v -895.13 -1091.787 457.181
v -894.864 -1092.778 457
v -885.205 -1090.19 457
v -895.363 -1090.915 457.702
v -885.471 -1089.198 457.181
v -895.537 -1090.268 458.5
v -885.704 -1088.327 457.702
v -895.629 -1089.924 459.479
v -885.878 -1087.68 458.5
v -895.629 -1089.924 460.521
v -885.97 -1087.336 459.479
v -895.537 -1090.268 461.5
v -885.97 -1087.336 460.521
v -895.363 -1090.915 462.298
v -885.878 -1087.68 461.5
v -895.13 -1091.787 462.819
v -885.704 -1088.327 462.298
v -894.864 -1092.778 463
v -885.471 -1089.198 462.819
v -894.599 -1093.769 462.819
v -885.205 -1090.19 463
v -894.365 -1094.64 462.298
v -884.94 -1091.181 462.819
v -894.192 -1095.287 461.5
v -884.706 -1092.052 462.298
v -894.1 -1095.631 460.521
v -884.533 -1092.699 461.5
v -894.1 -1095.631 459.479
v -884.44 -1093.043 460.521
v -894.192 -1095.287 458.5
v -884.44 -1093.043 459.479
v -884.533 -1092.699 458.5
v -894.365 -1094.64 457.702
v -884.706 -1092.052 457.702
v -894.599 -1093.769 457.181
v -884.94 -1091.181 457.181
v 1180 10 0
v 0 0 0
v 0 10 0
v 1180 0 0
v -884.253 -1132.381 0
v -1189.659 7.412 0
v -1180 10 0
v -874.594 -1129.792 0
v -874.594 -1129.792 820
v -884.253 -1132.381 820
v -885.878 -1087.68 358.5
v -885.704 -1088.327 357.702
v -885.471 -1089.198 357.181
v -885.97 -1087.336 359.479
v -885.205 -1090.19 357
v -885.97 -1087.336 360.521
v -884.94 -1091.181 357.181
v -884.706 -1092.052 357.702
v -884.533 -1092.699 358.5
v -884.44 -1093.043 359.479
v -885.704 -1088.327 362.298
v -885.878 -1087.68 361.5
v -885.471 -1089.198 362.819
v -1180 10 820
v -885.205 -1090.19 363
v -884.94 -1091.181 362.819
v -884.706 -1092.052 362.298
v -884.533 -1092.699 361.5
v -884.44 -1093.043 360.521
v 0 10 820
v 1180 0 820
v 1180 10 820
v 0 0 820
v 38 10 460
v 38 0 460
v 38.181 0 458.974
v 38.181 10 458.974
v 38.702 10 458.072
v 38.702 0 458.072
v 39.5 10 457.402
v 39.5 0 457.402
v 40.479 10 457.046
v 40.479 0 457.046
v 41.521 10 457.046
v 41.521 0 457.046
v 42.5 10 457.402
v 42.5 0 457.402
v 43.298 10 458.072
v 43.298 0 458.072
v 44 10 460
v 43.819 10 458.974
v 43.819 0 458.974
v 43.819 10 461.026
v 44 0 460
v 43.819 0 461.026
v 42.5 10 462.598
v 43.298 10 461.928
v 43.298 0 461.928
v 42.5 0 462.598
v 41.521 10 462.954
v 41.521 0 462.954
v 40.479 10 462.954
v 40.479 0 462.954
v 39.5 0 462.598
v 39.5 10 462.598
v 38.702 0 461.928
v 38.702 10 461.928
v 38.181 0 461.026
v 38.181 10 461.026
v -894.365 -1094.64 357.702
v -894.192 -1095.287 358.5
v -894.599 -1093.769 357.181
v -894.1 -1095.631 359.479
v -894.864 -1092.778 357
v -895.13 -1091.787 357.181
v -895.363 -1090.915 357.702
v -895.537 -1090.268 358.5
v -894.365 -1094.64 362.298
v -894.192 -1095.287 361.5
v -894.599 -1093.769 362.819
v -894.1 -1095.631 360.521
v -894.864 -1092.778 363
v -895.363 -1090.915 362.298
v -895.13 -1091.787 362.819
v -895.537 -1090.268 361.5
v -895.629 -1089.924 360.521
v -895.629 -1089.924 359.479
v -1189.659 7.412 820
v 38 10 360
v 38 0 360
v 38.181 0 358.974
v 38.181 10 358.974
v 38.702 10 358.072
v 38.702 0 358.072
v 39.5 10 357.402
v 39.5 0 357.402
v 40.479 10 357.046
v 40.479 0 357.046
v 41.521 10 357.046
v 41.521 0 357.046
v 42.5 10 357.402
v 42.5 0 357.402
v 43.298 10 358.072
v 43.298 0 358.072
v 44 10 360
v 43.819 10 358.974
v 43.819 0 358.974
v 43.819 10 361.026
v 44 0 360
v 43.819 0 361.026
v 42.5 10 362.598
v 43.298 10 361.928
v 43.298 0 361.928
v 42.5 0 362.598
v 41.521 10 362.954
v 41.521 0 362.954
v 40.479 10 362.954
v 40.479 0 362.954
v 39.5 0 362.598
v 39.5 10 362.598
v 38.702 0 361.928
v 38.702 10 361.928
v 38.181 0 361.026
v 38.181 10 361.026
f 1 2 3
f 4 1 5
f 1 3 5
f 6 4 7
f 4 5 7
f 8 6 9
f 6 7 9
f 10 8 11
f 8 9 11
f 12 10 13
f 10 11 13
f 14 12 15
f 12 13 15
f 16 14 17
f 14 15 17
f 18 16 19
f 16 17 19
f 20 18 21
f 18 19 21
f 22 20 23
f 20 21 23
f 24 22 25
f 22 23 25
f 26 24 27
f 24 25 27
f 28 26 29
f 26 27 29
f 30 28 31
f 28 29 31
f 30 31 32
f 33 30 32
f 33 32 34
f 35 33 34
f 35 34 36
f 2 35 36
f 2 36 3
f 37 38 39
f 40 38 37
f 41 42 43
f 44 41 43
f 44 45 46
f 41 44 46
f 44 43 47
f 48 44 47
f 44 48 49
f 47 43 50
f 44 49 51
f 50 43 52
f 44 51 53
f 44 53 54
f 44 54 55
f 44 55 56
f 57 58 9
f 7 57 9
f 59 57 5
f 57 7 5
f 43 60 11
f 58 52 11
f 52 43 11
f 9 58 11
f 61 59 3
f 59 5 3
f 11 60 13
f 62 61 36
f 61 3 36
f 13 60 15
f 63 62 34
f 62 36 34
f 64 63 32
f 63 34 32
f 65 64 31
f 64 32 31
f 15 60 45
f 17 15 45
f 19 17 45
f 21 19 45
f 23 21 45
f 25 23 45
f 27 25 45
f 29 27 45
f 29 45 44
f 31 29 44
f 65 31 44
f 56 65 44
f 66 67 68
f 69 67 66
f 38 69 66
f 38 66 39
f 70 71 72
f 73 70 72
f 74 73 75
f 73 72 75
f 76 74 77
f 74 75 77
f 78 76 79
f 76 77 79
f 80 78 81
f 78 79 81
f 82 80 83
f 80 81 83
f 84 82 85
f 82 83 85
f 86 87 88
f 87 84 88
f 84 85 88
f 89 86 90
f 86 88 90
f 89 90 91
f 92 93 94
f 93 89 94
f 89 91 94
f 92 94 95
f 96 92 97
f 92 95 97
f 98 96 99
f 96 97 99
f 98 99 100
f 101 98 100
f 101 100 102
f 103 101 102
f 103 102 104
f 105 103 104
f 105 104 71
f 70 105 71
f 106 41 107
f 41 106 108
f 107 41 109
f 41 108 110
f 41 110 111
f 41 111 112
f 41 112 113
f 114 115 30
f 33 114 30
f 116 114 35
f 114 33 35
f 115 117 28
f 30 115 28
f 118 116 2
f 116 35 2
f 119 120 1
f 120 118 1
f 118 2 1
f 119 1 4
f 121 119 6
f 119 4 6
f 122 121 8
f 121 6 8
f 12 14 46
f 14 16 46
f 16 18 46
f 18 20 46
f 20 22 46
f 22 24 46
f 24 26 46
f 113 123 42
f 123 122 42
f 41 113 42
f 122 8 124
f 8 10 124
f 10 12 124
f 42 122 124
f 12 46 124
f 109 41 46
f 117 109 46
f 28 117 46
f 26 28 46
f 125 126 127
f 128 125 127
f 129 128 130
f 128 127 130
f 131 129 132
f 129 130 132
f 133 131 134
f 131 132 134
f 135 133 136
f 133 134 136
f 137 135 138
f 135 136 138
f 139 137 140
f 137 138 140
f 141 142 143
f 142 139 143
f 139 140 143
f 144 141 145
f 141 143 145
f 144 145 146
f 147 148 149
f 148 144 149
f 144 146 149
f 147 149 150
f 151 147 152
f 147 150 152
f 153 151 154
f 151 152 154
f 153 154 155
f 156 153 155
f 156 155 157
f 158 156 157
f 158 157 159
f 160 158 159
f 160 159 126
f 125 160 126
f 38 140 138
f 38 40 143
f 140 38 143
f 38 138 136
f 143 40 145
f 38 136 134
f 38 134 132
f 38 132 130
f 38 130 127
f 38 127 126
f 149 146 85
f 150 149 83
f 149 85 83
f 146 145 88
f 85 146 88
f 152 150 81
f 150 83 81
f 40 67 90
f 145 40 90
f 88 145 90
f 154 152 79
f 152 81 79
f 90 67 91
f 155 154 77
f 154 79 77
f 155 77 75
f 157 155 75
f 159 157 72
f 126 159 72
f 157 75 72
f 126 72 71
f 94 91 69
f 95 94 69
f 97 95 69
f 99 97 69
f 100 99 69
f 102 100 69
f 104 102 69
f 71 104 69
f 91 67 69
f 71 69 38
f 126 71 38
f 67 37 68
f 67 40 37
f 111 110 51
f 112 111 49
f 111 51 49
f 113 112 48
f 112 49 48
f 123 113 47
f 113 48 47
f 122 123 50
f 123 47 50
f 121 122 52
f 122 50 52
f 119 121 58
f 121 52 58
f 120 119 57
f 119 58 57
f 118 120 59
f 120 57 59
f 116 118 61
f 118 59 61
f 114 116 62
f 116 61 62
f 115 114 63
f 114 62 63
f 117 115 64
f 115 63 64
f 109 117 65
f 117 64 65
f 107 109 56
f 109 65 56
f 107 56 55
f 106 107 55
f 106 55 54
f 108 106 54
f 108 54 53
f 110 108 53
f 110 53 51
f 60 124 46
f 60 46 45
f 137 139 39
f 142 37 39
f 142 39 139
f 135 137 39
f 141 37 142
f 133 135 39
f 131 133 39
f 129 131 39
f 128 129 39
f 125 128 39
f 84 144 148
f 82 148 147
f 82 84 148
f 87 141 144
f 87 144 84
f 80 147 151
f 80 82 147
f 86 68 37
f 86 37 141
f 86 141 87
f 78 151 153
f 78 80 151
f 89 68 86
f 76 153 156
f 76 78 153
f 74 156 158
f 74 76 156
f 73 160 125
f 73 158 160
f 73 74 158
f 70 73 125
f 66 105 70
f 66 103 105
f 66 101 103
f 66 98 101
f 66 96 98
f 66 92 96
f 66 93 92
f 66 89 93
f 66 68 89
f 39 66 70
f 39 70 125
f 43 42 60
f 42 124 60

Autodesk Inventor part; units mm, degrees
ref_plane "YZ Plane" through (0, 0, 0) normal (1, 0, 0) x (0, 1, 0)
ref_plane "XZ Plane" through (0, 0, 0) normal (0, 1, 0) x (-1, 0, 0)
ref_plane "XY Plane" through (0, 0, 0) normal (0, 0, 1) x (1, 0, 0)
sketch "Sketch1" plane through (0, 0, 0) normal (0, 1, 0) x (-1, 0, 0)
  line L0 (0, 0) -> (-1180, 0)
  line L1 (-1180, 0) -> (-1180, 820)
  line L2 (-1180, 820) -> (0, 820)
  line L3 (0, 820) -> (0, 0)
  line L4 (0, 410) -> (-41, 410)
  line L5 (-41, 410) -> (-41, 460)
  line L6 (-41, 460) -> (-41, 360)
  circle A0 centre (-41, 460) radius 3
  circle A1 centre (-41, 360) radius 3
  dimension "ancho_m" = 1180
  dimension "h_inf" = 820
  dimension "d2" = 41
  dimension "d3" = 50
  dimension "d4" = 100
  dimension "d5" = 6
  dimension "d6" = 6
extrude "Extrusion1" add sketch "Sketch1" along normal blind 10
sketch "Boceto10" plane through (0, 0, 820) normal (0, 0, 1) x (1, 0, 0)
  line L0 (1180, 10) -> (0, 10) projected
  line L1 (0, 10) -> (-1180, 10)
  line L2 (-1180, 10) -> (-874.5935, -1129.7925)
  line L3 (-1180, 10) -> (0, 10) construction
  line L4 (-874.5935, -1129.7925) -> (-884.2528, -1132.3807)
  line L5 (-884.2528, -1132.3807) -> (-1189.6593, 7.4118)
  line L6 (-1189.6593, 7.4118) -> (-1180, 10)
  point P0 (0, 0)
  dimension "d49" = 1180
  dimension "d50" = 1180
  dimension "angulo" = 75
  dimension "d52" = 10
  dimension "d53" = 1180
extrude "Extrusión10" add sketch "Boceto10" against normal blind 820
sketch "Boceto11" plane through (-874.5935, -1129.7925, 820) normal (0.9659258, 0.258819, 0) x (0, 0, -1)
  line L0 (0, 1180) -> (0, 0) projected
  line L1 (0, 0) -> (820, 0) projected
  line L2 (820, 1180) -> (820, 0) projected
  line L3 (0, 1180) -> (820, 1180) projected
  line L4 (0, 0) -> (820, 0) projected
  line L5 (410, 0) -> (410, 41)
  line L6 (410, 41) -> (360, 41)
  line L7 (360, 41) -> (460, 41)
  circle A0 centre (360, 41) radius 3
  circle A1 centre (460, 41) radius 3
  point P0 (820, 864.9343)
  dimension "d56" = 41
  dimension "d57" = 50
  dimension "d58" = 100
  dimension "d59" = 6
  dimension "d60" = 6
extrude "Extrusión11" cut sketch "Boceto11" against normal up to next contours A0 | A1
equation "\"d2\" = 0.05 * h_inf"
equation "\"d49\" = ancho_m"
equation "\"d50\" = ancho_m"
equation "\"d52\" = espesor"
equation "\"d53\" = ancho_m"
equation "\"d54\" = h_inf"
equation "\"d56\" = 0.05 * h_inf"
equation "\"d61\" = h_inf"
equation "\"espesor\" = 10"
properties part number "puerta_inf"
